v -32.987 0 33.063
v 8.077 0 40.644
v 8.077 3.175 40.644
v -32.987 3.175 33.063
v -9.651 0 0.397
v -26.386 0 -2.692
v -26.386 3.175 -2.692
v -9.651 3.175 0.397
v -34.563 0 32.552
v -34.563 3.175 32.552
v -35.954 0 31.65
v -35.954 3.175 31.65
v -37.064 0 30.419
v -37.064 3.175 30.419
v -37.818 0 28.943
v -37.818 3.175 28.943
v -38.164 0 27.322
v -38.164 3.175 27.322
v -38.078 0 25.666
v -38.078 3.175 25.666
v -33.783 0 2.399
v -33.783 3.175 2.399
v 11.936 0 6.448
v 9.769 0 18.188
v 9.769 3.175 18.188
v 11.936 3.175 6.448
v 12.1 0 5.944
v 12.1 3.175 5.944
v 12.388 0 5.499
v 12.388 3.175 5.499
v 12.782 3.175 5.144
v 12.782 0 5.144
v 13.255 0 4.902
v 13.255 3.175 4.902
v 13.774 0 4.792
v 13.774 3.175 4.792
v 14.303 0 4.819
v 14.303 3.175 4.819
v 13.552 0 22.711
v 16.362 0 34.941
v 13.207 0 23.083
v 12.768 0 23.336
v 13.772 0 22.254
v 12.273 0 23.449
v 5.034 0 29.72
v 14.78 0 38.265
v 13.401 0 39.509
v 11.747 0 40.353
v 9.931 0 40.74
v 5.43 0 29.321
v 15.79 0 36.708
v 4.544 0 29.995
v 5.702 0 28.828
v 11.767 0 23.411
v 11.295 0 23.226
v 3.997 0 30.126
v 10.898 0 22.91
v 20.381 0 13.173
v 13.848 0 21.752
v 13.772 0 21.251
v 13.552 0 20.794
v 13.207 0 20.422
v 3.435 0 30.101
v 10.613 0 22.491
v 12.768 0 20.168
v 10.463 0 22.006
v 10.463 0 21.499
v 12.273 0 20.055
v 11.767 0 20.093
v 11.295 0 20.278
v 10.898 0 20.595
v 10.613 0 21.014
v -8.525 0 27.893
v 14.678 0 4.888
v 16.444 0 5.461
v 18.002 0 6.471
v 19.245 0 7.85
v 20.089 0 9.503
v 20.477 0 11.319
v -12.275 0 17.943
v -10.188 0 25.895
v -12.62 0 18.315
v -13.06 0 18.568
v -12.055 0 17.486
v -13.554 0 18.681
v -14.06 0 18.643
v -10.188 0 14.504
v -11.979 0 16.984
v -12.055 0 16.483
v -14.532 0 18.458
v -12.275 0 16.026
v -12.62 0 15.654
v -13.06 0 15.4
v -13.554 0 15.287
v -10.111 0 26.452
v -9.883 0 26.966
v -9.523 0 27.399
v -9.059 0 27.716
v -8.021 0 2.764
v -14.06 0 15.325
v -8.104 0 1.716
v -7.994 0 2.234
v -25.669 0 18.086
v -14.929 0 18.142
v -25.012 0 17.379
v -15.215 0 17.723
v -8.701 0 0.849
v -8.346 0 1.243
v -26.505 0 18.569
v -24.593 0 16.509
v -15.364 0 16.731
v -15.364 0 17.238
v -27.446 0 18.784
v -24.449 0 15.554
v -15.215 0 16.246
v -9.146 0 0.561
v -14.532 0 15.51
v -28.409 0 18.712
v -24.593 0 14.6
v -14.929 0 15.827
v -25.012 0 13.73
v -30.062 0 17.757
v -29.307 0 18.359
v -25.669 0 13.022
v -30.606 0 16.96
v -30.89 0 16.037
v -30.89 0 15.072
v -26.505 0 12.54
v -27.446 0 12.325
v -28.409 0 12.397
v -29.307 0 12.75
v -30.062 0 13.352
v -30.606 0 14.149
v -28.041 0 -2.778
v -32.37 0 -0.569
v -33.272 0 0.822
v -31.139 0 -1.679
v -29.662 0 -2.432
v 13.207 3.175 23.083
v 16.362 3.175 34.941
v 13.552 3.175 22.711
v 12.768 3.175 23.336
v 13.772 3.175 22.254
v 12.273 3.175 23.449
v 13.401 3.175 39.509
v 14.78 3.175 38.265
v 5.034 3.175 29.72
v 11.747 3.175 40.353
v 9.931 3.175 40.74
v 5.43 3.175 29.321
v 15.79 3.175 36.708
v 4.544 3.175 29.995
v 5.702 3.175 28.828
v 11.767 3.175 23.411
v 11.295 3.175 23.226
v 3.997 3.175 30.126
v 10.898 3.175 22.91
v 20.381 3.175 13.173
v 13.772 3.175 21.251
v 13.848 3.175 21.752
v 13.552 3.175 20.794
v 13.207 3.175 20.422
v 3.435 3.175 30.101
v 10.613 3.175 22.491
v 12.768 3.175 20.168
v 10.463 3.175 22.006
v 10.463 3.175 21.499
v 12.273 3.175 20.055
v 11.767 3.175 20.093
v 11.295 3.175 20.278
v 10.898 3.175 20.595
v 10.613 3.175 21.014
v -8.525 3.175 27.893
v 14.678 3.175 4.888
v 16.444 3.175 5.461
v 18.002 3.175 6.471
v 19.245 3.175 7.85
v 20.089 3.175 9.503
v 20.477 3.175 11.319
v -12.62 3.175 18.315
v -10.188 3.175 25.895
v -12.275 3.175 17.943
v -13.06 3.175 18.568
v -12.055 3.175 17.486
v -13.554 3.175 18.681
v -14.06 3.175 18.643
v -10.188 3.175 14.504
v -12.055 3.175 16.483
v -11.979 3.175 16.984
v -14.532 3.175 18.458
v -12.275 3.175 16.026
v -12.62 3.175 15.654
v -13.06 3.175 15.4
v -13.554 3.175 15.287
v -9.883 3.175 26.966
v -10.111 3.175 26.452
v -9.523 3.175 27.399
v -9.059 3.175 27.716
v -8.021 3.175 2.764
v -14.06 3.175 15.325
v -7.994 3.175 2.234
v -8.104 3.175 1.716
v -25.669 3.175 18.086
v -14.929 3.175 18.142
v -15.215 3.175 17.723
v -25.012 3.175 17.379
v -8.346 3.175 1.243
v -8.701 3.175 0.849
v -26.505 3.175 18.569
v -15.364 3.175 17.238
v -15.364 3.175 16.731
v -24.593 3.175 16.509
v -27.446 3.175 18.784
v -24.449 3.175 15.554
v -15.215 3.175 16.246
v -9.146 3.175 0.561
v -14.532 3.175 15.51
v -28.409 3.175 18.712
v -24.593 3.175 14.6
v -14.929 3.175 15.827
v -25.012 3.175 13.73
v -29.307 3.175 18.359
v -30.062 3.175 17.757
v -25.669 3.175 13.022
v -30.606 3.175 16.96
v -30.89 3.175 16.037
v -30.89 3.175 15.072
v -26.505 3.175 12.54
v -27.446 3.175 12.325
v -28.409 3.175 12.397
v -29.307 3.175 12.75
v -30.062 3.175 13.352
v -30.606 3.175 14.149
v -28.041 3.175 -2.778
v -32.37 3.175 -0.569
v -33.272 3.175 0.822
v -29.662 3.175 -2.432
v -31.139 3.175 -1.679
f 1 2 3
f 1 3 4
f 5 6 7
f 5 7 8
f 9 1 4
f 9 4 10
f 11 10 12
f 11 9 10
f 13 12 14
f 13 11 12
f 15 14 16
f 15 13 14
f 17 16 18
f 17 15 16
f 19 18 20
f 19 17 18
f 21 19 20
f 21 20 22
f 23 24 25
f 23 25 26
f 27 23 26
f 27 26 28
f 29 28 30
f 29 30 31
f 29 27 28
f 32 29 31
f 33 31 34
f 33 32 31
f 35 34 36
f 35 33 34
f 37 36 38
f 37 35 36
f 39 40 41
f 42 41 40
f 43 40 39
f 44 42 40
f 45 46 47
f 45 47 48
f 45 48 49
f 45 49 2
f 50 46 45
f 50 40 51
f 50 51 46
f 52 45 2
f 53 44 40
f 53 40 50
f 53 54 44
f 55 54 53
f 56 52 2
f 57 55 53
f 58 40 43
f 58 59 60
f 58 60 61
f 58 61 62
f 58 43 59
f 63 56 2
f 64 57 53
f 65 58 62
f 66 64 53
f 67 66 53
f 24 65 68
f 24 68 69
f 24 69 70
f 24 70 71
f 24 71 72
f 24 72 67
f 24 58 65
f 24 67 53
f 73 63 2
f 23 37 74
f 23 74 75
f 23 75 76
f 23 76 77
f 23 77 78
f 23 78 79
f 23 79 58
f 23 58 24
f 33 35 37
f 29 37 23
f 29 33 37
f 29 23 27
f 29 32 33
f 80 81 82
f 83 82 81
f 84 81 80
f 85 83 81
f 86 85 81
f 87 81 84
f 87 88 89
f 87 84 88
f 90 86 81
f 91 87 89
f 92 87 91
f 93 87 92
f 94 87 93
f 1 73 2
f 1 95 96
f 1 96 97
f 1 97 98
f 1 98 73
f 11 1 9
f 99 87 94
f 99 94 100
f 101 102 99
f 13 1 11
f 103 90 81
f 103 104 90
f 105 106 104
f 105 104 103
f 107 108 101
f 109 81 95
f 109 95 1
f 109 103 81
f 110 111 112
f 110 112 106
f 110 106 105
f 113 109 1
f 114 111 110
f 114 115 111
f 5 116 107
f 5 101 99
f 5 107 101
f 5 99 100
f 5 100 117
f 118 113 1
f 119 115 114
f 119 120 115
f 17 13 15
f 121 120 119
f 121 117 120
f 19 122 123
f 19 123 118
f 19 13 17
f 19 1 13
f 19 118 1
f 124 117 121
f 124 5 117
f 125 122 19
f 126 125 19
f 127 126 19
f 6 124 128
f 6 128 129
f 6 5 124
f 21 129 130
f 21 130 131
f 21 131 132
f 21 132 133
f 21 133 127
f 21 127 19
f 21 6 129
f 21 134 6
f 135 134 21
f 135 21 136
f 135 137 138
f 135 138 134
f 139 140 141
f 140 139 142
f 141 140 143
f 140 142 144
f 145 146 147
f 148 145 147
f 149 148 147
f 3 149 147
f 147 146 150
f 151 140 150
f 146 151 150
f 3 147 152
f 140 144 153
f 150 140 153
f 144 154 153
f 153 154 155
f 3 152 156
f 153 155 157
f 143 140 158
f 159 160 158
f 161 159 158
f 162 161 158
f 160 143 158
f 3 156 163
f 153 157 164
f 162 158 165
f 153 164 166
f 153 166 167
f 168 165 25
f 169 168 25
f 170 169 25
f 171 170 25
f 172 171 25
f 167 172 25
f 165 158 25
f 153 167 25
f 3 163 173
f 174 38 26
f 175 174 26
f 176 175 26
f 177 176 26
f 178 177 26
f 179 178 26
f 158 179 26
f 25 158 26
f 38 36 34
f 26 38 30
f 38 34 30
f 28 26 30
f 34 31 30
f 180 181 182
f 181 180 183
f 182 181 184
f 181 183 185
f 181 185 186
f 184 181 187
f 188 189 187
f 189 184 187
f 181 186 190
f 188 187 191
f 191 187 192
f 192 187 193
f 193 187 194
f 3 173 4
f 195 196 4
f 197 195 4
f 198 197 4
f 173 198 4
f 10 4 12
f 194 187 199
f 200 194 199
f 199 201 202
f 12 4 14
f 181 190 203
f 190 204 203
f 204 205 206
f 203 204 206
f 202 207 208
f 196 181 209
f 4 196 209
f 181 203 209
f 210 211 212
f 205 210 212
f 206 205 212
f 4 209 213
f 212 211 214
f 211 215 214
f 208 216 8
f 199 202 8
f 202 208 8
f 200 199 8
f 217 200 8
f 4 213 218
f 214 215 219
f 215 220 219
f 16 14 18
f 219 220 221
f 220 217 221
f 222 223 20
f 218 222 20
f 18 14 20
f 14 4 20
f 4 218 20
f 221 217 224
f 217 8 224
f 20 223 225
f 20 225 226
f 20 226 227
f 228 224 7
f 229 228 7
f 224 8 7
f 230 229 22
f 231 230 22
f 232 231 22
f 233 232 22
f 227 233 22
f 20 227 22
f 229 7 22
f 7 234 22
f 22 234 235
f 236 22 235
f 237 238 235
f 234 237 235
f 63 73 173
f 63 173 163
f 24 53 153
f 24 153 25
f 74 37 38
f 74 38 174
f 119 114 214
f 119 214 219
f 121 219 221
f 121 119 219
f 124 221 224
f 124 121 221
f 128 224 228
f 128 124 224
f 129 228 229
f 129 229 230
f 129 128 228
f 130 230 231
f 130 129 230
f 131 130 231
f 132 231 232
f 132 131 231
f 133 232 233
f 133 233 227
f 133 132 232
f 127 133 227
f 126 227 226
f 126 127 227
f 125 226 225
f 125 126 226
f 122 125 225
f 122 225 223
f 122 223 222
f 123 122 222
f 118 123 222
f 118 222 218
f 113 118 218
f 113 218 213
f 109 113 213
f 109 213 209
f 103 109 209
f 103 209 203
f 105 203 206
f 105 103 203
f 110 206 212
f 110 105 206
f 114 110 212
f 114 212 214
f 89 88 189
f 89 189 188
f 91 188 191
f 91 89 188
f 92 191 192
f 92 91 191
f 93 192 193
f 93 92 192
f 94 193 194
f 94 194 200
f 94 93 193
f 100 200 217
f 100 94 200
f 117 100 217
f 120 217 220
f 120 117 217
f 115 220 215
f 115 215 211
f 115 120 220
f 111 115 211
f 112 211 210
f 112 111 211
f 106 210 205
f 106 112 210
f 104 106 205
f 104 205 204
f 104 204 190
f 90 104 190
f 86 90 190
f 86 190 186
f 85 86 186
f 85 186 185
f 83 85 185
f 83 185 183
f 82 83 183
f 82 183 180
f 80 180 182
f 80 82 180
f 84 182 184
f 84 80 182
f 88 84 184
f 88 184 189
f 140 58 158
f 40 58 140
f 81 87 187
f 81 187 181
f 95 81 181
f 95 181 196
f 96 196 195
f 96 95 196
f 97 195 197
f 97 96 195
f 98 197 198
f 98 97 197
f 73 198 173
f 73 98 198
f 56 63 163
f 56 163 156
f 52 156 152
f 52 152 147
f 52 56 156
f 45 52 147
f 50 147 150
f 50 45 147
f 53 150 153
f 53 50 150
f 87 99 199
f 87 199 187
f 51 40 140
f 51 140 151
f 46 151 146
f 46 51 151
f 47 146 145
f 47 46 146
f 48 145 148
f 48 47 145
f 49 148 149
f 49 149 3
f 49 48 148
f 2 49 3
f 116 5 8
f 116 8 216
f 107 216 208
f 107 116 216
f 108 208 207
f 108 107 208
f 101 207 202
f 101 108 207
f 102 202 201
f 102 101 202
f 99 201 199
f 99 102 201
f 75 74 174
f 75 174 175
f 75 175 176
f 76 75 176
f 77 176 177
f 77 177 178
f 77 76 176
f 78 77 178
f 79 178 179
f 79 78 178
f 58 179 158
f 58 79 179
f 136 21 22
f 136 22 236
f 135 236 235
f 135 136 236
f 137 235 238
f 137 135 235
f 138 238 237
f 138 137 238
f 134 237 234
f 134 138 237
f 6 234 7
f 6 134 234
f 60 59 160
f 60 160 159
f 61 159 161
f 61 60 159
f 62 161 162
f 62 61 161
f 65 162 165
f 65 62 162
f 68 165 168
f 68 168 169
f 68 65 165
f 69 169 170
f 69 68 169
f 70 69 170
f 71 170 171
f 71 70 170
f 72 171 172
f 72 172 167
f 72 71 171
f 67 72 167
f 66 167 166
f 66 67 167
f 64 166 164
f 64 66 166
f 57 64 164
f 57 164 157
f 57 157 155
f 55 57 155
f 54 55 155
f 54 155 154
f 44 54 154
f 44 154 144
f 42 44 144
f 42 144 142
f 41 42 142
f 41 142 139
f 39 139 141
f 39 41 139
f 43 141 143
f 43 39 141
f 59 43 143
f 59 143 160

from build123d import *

# Parameters (mm, degrees)
SKETCH1_R           = 1.7018
SKETCH1_R_2         = 3.2385
BOSS_EXTRUDE1_DEPTH = 3.175


with BuildPart() as part:
    # Sketch1 → Boss-Extrude1 (new body)
    with BuildSketch(Plane(origin=(0, 0, 0), x_dir=(1, 0, 0), z_dir=(0, 1, 0))):
        with BuildLine():
            Line((-26.385767095, 2.692431218), (-9.650546347, -0.397020276))
            ThreePointArc((-9.650546347, -0.397020276), (-8.345625907, -1.243134279), (-8.021200765, -2.76414532))
            Line((-8.021200765, -2.76414532), (-10.188427932, -14.503777784))
            Line((-10.188427932, -14.503777784), (-10.188427932, -25.895050365))
            ThreePointArc((-10.188427932, -25.895050365), (-9.718255056, -27.194942681), (-8.525317662, -27.893285678))
            Line((-8.525317662, -27.893285678), (3.434770775, -30.101210727))
            ThreePointArc((3.434770775, -30.101210727), (4.798418745, -29.874833209), (5.701723859, -28.828495578))
            Line((5.701723859, -28.828495578), (9.768947258, -18.188063969))
            Line((9.768947258, -18.188063969), (11.936174425, -6.448431504))
            ThreePointArc((11.936174425, -6.448431504), (12.782288428, -5.143511064), (14.303299469, -4.819085921))
            Line((14.303299469, -4.819085921), (14.67796859, -4.888252746))
            ThreePointArc((14.67796859, -4.888252746), (19.245190129, -7.849651756), (20.380678129, -13.173190399))
            Line((20.380678129, -13.173190399), (16.362085627, -34.941466341))
            ThreePointArc((16.362085627, -34.941466341), (13.400686617, -39.50868788), (8.077147974, -40.64417588))
            Line((8.077147974, -40.64417588), (-32.986587711, -33.063491917))
            ThreePointArc((-32.986587711, -33.063491917), (-37.064464086, -30.419385658), (-38.078292657, -25.666226155))
            Line((-38.078292657, -25.666226155), (-33.783032856, -2.399273728))
            ThreePointArc((-33.783032856, -2.399273728), (-31.138926597, 1.678602647), (-26.385767095, 2.692431218))
        make_face()
        with Locations((12.145909657, -21.752201671)):
            Circle(SKETCH1_R, mode=Mode.SUBTRACT)
        with Locations((-13.681281765, -16.984301904)):
            Circle(SKETCH1_R, mode=Mode.SUBTRACT)
        with Locations((-27.68794209, -15.55442008)):
            Circle(SKETCH1_R_2, mode=Mode.SUBTRACT)
    extrude(amount=BOSS_EXTRUDE1_DEPTH)


solid = part.part
